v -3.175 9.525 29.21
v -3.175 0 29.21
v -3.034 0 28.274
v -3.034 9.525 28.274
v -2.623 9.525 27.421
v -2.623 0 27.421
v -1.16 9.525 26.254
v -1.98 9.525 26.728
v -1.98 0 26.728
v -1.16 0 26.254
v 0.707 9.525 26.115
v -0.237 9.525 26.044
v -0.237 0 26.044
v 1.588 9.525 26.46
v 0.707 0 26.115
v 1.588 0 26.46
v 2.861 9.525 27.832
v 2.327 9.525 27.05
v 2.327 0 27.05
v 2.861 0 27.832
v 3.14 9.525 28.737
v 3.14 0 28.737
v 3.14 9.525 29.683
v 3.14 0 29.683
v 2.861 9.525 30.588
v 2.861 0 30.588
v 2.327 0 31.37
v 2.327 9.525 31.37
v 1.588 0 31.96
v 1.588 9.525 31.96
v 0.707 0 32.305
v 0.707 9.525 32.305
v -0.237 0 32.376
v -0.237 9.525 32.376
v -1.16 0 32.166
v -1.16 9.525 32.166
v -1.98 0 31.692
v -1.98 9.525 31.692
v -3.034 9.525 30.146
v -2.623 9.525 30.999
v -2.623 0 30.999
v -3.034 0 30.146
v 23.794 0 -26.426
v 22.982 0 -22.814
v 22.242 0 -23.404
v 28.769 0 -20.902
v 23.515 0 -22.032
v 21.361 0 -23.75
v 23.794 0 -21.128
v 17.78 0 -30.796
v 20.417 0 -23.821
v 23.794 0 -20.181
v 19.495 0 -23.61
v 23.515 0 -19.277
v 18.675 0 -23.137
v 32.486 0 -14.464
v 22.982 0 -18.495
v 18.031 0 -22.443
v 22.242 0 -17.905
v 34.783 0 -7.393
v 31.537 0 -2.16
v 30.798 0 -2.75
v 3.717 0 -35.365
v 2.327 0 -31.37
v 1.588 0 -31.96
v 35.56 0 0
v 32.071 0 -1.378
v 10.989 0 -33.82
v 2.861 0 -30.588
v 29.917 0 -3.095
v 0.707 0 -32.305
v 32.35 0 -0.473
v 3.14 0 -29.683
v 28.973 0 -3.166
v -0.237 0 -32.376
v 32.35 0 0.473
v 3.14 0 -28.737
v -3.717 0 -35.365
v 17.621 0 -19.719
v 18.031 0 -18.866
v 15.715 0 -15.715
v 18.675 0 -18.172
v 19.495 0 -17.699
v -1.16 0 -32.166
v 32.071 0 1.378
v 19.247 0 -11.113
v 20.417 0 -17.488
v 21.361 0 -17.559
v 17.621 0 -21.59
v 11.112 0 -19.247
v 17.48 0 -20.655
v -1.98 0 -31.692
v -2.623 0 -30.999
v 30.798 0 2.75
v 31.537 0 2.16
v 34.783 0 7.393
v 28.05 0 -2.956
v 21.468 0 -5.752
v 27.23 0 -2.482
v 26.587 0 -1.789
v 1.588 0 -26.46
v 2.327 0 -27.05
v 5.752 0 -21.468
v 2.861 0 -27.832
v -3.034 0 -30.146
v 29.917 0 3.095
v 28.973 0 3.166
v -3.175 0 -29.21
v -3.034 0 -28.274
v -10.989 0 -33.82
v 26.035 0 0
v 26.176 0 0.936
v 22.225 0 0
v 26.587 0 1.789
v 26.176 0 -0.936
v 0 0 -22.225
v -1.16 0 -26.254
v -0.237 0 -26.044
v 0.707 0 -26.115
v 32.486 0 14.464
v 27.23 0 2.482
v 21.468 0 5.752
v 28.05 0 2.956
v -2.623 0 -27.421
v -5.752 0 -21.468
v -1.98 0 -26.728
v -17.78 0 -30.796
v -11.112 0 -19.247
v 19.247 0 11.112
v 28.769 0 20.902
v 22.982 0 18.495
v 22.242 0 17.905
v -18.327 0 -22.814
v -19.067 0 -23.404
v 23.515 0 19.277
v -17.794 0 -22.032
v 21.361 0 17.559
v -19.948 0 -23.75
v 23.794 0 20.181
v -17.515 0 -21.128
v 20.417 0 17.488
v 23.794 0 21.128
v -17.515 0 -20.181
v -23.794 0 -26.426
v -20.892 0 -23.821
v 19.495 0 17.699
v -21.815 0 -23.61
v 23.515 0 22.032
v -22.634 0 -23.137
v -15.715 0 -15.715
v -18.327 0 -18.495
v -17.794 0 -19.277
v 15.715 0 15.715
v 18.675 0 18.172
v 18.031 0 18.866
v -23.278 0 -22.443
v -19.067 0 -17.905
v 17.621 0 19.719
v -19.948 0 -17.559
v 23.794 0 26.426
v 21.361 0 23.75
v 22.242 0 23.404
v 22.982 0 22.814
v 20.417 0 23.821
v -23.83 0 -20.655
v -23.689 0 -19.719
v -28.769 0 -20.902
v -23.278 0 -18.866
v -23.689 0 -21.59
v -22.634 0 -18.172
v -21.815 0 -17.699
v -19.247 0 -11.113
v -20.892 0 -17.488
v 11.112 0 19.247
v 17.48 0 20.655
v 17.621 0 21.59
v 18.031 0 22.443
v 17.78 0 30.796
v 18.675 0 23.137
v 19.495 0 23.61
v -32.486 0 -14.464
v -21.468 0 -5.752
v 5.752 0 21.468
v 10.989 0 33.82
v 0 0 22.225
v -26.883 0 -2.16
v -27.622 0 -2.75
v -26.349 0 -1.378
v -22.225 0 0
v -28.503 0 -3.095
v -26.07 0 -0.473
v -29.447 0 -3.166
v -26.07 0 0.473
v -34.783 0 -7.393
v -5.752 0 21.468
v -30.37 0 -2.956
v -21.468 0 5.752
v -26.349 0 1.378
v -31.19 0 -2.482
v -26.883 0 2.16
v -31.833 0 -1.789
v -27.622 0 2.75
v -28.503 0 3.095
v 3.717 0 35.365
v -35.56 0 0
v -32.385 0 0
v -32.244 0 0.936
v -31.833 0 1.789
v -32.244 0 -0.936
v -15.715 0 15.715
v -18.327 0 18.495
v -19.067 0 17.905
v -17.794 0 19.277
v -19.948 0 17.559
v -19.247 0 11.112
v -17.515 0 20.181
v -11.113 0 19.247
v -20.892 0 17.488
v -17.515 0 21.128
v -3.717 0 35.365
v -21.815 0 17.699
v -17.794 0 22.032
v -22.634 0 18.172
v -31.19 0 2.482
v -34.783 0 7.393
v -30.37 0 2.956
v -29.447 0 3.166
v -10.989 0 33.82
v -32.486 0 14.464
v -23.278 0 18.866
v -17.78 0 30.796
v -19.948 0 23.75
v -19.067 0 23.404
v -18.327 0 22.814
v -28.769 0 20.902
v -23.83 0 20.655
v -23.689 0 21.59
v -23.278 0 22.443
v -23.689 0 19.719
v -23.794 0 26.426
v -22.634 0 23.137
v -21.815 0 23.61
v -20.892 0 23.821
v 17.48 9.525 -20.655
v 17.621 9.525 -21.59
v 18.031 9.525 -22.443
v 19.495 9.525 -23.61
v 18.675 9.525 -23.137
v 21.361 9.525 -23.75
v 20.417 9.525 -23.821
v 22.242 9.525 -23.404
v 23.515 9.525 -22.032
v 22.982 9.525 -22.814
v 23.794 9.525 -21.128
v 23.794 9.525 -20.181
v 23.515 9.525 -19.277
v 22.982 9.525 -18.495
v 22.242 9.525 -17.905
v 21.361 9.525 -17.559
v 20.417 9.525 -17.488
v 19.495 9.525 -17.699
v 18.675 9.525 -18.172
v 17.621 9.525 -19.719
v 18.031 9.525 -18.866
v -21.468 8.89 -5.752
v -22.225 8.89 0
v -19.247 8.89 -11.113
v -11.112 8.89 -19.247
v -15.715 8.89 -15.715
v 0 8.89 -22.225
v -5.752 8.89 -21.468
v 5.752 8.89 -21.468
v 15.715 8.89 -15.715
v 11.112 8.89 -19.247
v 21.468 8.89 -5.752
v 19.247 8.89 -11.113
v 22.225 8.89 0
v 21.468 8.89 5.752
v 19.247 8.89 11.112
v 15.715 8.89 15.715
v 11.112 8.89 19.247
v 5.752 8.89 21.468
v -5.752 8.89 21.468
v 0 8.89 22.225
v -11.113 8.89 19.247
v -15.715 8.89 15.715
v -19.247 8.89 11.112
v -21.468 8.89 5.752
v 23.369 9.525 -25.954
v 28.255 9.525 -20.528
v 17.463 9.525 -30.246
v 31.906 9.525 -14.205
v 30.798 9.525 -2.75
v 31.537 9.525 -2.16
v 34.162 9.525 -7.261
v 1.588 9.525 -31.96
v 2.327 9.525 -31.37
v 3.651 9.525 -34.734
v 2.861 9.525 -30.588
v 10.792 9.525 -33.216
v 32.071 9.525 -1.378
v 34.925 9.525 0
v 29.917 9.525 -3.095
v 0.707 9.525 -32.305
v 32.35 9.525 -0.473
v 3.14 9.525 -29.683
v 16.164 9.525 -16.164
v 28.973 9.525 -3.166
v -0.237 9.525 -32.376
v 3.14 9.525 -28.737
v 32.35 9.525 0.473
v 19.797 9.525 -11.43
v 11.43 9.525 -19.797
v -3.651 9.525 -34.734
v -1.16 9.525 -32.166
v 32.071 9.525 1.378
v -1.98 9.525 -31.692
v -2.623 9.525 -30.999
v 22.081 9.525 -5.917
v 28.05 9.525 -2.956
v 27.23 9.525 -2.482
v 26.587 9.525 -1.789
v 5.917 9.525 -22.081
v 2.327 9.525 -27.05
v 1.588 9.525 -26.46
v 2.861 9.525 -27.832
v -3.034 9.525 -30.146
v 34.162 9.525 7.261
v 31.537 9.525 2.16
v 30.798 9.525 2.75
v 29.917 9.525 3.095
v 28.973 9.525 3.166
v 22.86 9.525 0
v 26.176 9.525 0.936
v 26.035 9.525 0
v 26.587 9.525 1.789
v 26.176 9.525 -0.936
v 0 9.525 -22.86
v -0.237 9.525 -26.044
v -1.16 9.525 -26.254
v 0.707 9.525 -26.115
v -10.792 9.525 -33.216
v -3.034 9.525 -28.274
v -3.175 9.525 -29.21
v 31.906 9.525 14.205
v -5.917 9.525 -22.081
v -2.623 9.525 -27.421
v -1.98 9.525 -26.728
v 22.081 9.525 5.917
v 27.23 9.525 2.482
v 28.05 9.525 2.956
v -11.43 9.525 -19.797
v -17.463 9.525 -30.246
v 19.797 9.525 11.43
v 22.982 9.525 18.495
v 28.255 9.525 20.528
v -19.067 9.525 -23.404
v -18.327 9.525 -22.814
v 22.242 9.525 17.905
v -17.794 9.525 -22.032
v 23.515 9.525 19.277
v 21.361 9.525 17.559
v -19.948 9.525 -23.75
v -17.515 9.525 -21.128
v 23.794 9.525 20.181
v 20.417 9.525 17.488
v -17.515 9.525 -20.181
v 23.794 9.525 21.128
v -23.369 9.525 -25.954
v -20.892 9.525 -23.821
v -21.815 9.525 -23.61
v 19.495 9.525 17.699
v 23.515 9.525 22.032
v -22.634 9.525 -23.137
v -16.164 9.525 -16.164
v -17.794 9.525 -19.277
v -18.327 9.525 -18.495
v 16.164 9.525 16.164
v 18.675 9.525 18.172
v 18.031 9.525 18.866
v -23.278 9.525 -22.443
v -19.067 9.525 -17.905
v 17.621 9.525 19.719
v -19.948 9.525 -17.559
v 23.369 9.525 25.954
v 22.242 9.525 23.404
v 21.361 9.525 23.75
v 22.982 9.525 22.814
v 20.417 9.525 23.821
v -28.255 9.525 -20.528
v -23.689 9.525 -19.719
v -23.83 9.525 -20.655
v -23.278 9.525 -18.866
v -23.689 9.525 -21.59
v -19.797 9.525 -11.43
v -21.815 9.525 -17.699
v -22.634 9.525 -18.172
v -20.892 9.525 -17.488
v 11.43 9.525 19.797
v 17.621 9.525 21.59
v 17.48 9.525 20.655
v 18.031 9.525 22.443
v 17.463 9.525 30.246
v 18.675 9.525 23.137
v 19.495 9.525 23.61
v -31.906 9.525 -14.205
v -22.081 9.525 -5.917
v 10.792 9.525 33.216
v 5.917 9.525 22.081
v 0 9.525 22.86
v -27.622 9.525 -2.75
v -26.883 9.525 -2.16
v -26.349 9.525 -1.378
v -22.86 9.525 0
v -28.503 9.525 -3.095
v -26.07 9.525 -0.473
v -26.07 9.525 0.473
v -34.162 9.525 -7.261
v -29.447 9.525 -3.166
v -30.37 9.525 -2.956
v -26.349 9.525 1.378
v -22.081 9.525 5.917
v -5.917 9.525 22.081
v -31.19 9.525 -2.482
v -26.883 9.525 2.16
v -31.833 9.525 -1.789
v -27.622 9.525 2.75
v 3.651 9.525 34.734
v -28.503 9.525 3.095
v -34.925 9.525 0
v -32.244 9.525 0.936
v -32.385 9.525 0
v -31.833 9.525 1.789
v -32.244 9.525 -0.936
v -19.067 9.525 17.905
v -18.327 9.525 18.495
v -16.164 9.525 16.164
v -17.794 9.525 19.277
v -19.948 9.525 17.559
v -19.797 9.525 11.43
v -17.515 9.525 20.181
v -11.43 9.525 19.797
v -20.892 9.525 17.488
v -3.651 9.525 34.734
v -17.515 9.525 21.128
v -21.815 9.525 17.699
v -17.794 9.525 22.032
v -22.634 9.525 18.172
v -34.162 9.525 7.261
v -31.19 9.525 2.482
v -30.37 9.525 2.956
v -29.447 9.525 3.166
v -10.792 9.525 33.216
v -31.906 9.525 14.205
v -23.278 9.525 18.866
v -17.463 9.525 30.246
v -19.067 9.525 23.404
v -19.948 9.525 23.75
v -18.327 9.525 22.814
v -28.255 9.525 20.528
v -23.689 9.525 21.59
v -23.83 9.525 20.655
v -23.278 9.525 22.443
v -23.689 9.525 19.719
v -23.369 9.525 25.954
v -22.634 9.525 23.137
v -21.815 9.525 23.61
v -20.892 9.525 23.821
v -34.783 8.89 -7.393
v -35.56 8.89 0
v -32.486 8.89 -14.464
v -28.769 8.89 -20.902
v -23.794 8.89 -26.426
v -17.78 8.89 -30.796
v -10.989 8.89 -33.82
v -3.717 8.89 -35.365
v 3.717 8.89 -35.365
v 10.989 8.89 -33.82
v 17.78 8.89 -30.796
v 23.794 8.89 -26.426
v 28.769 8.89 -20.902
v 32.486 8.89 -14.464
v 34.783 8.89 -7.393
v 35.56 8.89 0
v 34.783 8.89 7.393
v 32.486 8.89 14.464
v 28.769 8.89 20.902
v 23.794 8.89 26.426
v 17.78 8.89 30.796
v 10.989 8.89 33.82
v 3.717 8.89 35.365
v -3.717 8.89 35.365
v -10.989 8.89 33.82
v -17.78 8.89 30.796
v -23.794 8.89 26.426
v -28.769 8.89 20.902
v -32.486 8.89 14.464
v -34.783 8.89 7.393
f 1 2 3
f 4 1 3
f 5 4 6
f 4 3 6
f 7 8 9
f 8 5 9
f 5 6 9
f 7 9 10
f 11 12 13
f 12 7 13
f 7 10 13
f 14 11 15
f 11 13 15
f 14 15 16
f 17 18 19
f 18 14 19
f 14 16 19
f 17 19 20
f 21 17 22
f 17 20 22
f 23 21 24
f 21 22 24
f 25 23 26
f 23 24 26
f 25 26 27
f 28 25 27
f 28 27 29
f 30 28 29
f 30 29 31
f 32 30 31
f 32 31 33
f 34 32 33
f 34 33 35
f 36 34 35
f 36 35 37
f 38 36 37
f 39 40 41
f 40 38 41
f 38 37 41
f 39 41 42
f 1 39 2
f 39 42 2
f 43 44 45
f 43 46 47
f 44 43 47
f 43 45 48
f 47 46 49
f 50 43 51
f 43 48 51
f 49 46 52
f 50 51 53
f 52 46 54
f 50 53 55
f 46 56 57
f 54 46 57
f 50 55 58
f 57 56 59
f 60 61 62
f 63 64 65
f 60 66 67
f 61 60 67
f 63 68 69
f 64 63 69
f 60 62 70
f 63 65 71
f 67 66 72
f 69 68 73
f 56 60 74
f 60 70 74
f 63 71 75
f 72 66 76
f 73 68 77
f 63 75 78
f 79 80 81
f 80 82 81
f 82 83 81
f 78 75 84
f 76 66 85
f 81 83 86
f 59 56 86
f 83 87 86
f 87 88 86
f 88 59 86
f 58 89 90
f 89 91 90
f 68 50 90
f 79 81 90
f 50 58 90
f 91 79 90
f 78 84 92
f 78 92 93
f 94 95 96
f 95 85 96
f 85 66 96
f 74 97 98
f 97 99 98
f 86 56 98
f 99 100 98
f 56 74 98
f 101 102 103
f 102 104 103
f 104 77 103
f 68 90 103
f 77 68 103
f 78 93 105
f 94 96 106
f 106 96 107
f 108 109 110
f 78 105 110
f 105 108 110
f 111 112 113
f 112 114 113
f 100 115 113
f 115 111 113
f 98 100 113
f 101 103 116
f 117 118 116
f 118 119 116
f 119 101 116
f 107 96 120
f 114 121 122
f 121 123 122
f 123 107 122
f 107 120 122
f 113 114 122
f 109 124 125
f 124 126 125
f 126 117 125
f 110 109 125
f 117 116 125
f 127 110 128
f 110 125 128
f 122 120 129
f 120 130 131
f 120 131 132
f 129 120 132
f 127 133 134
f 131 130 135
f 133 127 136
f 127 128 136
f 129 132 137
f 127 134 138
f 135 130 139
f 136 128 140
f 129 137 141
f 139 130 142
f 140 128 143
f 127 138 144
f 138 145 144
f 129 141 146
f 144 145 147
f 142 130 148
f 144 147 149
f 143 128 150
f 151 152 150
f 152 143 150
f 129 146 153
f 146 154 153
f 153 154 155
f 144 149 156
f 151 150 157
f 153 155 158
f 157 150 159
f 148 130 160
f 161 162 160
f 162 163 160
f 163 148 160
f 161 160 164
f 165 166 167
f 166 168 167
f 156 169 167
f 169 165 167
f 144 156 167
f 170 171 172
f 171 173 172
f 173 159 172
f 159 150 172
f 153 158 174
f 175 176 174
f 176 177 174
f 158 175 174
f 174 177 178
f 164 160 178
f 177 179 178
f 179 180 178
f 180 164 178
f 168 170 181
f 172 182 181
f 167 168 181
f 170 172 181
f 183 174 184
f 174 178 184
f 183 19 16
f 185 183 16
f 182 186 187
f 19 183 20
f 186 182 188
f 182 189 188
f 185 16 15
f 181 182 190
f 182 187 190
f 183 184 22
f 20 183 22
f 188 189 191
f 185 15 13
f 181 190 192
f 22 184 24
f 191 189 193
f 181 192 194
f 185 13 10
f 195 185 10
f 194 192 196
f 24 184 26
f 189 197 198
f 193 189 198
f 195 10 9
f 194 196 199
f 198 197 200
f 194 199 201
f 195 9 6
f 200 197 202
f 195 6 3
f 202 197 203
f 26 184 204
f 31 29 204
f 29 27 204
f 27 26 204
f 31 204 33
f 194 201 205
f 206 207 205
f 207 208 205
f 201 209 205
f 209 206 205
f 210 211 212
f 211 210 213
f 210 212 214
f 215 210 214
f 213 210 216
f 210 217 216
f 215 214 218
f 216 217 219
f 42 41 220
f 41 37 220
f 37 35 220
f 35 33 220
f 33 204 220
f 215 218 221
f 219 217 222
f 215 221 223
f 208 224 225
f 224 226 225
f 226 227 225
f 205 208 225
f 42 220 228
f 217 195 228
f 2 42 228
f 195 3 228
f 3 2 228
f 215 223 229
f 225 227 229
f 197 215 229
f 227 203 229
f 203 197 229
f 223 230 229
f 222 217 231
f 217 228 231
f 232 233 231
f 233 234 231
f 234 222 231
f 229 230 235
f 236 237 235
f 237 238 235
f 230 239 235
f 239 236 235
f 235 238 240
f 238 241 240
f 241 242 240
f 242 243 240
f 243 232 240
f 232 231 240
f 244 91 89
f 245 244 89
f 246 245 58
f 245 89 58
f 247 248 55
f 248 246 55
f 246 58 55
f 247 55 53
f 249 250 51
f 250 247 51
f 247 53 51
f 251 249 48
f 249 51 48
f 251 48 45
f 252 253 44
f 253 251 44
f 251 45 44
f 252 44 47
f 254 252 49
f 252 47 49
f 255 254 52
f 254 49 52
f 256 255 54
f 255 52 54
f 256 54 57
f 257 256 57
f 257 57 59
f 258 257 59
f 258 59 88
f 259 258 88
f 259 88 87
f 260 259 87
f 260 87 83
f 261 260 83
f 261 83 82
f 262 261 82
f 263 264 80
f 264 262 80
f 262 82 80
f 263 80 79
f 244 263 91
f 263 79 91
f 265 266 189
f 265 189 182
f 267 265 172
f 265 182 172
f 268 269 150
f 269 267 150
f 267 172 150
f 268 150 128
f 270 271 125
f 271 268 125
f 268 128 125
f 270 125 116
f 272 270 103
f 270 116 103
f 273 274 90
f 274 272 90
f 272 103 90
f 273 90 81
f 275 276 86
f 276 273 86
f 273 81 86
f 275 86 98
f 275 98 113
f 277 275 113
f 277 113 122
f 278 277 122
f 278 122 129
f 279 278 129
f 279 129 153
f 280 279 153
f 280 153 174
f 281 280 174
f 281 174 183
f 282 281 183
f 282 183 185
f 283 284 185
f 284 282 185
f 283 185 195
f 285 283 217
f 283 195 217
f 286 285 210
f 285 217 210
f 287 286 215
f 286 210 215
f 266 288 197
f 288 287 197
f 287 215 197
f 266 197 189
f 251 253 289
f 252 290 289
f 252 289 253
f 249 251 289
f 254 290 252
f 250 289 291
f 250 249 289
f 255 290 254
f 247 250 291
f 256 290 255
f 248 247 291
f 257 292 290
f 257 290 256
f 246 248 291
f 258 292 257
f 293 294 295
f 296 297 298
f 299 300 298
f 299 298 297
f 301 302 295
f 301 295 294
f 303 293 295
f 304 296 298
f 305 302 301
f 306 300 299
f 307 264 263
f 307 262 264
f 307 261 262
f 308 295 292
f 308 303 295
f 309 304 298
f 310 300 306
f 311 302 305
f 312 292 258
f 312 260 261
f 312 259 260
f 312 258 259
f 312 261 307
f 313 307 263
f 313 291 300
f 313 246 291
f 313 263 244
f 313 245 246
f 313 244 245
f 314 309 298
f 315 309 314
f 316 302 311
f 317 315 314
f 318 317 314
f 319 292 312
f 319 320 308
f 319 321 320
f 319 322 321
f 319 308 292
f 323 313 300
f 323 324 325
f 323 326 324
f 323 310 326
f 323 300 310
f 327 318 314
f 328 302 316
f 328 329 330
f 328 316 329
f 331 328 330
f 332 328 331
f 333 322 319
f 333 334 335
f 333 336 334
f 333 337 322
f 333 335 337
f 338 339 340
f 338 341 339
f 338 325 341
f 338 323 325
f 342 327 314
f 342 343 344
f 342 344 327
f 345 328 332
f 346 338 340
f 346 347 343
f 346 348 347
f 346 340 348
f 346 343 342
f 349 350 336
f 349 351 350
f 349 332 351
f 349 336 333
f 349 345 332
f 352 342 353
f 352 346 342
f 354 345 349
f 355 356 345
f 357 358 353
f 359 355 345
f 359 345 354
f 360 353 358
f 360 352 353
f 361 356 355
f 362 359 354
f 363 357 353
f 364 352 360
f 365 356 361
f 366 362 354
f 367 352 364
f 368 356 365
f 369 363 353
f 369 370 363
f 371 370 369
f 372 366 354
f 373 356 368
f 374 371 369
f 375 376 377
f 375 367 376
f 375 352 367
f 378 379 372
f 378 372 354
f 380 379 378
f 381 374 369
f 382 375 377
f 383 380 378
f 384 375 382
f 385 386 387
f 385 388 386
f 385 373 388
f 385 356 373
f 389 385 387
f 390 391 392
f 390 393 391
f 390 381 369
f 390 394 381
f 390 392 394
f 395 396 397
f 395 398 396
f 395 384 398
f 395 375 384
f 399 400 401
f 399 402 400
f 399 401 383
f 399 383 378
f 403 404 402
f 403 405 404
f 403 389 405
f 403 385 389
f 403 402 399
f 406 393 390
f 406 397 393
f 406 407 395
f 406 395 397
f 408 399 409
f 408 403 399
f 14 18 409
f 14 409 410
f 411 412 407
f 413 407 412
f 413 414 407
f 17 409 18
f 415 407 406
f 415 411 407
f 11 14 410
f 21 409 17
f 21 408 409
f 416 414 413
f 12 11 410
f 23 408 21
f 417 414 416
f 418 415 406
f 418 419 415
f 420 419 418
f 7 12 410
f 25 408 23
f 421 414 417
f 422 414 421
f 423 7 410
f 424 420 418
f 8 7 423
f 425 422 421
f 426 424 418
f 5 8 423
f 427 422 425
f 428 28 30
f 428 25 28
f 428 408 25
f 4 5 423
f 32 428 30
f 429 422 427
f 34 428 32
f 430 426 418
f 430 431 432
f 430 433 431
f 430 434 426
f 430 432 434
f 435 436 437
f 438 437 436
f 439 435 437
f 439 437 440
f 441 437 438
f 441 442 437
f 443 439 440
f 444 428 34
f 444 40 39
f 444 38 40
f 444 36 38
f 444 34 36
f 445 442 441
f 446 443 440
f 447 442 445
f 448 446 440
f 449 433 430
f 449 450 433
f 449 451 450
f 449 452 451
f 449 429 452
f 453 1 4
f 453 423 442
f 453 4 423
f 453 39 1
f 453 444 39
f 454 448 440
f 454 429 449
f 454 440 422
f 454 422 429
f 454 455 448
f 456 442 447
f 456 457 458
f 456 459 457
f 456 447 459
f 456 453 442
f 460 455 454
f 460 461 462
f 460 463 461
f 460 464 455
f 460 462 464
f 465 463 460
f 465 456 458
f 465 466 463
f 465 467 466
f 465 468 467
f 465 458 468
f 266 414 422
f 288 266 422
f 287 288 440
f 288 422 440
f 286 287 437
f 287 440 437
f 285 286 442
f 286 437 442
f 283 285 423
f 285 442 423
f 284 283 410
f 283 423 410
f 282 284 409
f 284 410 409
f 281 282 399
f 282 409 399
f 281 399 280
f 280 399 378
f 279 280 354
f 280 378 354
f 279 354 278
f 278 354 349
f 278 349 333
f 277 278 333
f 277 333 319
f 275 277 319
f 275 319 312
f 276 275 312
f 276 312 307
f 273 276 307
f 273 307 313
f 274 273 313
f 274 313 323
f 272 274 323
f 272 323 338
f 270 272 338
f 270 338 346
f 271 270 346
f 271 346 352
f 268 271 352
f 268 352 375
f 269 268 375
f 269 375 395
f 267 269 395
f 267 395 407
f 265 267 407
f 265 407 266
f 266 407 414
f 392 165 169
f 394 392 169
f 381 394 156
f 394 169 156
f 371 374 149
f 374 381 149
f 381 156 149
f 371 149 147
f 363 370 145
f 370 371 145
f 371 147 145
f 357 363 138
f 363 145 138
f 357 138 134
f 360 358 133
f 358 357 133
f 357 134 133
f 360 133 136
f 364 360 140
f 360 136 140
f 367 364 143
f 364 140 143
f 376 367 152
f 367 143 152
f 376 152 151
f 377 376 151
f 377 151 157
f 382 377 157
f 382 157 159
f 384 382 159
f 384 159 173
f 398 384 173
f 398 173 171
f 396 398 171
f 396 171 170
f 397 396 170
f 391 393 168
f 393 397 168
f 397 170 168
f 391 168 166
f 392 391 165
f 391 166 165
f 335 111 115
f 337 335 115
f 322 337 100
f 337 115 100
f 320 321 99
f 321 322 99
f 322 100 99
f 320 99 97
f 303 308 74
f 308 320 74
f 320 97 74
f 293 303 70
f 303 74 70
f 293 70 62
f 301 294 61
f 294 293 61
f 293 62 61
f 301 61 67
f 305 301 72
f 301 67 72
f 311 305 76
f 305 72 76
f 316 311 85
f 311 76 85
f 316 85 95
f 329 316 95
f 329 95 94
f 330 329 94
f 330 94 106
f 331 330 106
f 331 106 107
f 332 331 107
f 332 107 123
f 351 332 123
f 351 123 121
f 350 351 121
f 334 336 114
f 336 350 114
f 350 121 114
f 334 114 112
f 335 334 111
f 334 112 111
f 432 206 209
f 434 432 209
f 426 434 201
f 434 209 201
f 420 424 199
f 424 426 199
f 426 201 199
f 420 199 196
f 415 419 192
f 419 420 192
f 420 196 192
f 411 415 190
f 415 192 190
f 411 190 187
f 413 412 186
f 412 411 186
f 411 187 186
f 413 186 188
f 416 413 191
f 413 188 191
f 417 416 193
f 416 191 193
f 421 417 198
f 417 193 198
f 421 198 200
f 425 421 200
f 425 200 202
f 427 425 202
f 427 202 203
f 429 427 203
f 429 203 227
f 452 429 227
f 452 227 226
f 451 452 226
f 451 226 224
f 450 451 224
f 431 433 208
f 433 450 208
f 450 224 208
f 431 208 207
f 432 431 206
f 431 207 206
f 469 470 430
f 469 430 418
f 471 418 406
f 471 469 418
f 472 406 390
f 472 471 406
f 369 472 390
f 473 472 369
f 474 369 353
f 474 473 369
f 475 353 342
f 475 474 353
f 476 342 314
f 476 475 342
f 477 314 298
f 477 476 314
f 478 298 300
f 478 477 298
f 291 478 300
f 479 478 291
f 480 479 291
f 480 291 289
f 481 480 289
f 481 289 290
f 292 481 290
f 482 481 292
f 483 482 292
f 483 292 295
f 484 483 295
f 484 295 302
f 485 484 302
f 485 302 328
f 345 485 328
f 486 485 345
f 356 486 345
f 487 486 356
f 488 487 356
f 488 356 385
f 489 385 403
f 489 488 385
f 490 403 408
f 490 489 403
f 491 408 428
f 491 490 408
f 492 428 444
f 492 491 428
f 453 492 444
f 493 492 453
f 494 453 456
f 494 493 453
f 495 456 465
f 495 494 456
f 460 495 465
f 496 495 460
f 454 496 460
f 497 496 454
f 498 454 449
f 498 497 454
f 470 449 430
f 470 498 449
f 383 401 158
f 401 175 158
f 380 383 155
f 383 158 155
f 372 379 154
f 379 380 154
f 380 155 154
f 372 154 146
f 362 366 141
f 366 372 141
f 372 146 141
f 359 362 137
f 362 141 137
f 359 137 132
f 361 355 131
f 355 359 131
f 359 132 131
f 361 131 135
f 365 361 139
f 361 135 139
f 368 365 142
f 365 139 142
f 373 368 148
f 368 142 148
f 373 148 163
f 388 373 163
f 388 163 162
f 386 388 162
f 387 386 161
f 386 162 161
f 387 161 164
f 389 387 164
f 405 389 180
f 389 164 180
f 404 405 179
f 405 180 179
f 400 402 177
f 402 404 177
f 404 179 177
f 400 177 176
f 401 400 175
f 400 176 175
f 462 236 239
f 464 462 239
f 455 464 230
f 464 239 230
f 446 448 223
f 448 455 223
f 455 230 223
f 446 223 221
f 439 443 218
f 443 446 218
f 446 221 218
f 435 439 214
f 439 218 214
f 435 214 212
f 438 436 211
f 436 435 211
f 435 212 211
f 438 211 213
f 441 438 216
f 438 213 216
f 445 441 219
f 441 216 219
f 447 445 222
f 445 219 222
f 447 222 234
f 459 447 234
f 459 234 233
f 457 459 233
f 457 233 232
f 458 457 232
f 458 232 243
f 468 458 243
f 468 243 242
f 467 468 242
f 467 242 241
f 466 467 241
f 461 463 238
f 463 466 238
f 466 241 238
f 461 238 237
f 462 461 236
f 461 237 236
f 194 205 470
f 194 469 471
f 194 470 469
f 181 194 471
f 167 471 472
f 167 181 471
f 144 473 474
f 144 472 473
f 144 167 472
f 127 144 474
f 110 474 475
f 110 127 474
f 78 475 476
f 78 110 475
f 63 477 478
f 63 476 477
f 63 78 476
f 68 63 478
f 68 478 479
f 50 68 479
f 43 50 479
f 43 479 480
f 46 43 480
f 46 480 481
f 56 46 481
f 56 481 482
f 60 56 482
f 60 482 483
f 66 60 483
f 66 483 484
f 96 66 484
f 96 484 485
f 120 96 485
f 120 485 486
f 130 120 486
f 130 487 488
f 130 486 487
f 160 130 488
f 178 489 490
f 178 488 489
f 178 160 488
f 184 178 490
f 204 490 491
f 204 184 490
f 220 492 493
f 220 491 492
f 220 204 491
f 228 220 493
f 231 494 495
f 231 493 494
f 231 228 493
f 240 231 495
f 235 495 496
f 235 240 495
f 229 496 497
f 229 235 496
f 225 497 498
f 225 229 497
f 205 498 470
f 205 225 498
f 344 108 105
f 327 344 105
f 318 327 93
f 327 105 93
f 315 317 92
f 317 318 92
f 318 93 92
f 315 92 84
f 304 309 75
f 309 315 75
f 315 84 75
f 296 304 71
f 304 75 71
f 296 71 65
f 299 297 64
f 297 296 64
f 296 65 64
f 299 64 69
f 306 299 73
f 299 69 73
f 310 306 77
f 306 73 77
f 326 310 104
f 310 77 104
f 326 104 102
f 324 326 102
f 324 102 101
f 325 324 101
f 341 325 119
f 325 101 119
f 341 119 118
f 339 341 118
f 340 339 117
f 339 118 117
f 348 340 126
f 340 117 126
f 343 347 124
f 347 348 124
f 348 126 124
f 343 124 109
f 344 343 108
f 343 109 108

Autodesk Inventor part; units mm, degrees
ref_plane "YZ Plane" through (0, 0, 0) normal (1, 0, 0) x (0, 1, 0)
ref_plane "XZ Plane" through (0, 0, 0) normal (0, 1, 0) x (-1, 0, 0)
ref_plane "XY Plane" through (0, 0, 0) normal (0, 0, 1) x (1, 0, 0)
sketch "Sketch1" plane through (0, 0, 0) normal (0, 1, 0) x (-1, 0, 0)
  circle A0 centre (0, 0) radius 35.56
  circle A1 centre (0, 0) radius 22.225
  line L0 (0, 0) -> (29.21, 0) construction
  circle A2 centre (29.21, 0) radius 3.175
  circle A3 centre (20.6546, 20.6546) radius 3.175
  circle A4 centre (0, 29.21) radius 3.175
  circle A5 centre (-20.6546, 20.6546) radius 3.175
  circle A6 centre (-29.21, 0) radius 3.175
  circle A7 centre (-20.6546, -20.6546) radius 3.175
  circle A8 centre (0, -29.21) radius 3.175
  circle A9 centre (20.6546, -20.6546) radius 3.175
  dimension "d0" = 71.12
  dimension "d1" = 44.45
  dimension "d2" = 29.21
  dimension "d3" = 6.35
  dimension "d6" = 360
extrude "Extrusion1" add sketch "Sketch1" along normal blind 9.525
thread "Thread1" size "1/4-20 UNC" class "2B" standard "ANSI Unified Screw Threads" full length
thread "Thread2" size "1/4-20 UNC" class "2B" standard "ANSI Unified Screw Threads" full length
thread "Thread3" size "1/4-20 UNC" class "2B" standard "ANSI Unified Screw Threads" full length
thread "Thread4" size "1/4-20 UNC" class "2B" standard "ANSI Unified Screw Threads" full length
thread "Thread5" size "1/4-20 UNC" class "2B" standard "ANSI Unified Screw Threads" full length
thread "Thread6" size "1/4-20 UNC" class "2B" standard "ANSI Unified Screw Threads" full length
thread "Thread7" size "1/4-20 UNC" class "2B" standard "ANSI Unified Screw Threads" full length
thread "Thread8" size "1/4-20 UNC" class "2B" standard "ANSI Unified Screw Threads" full length
chamfer "Chamfer1" distance 0.635 angle 45 2 edges at (35.56, 9.525, 0) (22.225, 9.525, 0)
equation "\"d2\" = 0.5 * d0 - d3"
properties part number "Rotary Pneumatic Cylinder Axis" material "Aluminum 6061"
